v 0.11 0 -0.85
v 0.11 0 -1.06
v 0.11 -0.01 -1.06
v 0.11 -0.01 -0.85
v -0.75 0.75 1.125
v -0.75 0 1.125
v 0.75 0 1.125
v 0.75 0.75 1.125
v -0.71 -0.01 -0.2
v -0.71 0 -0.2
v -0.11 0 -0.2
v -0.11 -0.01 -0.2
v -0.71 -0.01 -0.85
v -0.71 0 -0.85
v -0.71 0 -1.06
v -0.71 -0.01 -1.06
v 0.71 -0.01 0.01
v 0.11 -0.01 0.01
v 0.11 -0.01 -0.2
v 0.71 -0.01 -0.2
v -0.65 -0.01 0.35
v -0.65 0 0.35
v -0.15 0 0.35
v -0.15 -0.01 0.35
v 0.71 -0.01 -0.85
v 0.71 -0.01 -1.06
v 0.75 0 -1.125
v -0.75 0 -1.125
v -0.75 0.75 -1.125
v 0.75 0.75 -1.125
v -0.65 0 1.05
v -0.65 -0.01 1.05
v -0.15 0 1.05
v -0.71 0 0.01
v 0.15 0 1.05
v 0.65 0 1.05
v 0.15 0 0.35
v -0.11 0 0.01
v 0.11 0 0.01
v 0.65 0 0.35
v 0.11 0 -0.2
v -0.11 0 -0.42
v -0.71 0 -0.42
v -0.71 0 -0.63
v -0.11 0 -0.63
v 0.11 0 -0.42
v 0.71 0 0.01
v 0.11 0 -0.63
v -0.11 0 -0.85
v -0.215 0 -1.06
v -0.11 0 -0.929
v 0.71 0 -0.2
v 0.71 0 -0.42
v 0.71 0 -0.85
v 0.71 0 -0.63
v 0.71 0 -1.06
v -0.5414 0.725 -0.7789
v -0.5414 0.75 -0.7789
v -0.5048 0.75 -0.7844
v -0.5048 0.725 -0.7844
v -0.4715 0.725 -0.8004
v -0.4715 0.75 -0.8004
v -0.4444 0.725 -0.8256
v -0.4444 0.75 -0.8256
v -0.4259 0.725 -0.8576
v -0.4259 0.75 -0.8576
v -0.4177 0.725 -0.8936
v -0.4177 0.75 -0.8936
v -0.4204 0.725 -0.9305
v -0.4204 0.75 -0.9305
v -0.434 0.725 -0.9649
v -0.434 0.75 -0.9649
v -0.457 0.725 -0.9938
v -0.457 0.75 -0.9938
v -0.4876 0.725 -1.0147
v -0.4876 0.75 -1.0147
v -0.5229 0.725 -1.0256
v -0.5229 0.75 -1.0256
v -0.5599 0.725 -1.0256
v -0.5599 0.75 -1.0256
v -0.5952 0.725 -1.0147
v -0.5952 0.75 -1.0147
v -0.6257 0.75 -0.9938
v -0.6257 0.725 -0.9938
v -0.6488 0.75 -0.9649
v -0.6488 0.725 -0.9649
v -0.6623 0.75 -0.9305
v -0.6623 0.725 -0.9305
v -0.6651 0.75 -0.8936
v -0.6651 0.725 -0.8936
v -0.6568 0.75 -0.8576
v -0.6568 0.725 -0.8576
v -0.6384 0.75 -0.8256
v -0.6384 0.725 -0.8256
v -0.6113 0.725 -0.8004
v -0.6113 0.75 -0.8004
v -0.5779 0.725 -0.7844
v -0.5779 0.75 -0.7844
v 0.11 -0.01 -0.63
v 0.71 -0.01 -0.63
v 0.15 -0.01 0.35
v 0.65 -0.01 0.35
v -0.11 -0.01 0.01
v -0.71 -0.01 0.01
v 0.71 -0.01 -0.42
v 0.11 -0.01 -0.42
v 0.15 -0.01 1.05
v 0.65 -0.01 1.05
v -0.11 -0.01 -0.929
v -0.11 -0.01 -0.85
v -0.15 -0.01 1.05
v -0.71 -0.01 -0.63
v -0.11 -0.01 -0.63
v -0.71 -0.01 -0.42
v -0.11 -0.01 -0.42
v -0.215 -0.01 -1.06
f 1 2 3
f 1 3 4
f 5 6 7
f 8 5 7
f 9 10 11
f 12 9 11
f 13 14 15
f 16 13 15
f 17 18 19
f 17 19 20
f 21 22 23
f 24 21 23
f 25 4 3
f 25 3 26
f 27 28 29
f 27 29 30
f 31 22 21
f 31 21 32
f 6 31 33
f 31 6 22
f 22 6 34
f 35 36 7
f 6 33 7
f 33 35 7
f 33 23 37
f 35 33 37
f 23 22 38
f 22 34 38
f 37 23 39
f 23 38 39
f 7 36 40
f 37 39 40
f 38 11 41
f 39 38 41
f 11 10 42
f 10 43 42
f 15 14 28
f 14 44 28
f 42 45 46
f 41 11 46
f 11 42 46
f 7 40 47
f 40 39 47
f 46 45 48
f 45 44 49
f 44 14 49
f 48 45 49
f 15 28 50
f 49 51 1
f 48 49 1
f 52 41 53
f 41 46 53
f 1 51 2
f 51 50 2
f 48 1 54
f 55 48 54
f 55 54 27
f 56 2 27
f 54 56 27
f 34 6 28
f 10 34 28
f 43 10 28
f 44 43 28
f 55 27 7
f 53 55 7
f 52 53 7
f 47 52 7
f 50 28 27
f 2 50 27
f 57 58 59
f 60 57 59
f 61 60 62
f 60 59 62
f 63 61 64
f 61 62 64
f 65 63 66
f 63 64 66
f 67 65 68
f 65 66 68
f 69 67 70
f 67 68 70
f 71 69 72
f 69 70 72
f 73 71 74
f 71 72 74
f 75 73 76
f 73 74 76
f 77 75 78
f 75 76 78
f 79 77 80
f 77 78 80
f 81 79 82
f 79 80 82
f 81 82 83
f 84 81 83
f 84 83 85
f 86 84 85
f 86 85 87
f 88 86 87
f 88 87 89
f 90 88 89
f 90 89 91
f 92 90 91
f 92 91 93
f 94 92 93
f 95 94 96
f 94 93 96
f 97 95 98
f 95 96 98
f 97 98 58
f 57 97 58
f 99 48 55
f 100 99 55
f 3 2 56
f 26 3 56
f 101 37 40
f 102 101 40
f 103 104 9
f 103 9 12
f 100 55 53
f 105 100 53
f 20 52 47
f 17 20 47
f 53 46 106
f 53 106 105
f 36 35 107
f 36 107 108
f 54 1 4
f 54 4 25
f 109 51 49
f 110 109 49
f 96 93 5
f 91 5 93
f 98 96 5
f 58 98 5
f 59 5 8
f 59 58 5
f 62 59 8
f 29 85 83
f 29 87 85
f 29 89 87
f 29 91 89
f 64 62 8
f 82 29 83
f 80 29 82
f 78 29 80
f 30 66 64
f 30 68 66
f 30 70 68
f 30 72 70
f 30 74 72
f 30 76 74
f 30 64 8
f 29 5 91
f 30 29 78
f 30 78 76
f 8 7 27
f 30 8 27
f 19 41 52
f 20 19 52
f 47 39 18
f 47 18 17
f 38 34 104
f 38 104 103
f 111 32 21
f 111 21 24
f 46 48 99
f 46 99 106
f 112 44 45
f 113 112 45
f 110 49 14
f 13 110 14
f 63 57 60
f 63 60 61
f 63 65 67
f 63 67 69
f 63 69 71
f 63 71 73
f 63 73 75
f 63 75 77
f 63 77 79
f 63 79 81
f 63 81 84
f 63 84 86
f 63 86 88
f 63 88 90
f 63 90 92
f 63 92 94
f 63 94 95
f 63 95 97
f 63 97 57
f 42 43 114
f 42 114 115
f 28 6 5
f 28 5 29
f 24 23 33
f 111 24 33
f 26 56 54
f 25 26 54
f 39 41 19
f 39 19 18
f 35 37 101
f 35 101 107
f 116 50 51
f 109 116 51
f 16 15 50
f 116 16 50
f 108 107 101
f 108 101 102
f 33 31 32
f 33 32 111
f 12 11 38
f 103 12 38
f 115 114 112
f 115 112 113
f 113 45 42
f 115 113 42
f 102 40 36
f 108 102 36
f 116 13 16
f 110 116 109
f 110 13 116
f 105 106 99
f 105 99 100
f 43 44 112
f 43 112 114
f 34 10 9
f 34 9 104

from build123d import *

# Parameters (mm, degrees)
SKETCH1_W           = 1.5
SKETCH1_H           = 2.25
BOSS_EXTRUDE1_DEPTH = 0.75
SKETCH2_R           = 0.124038388
CUT_EXTRUDE1_DEPTH  = 0.025
SKETCH3_W           = 0.5
SKETCH3_H           = 0.7
SKETCH3_W_2         = 0.6
SKETCH3_H_2         = 0.21
BOSS_EXTRUDE2_DEPTH = 0.01


with BuildPart() as part:
    # Sketch1 → Boss-Extrude1 (new body)
    with BuildSketch(Plane(origin=(0, 0, 0), x_dir=(1, 0, 0), z_dir=(0, 1, 0))):
        Rectangle(SKETCH1_W, SKETCH1_H)
    extrude(amount=BOSS_EXTRUDE1_DEPTH)

    # Sketch2 → Cut-Extrude1 (cut)
    with BuildSketch(Plane(origin=(0, 0.75, 0), x_dir=(1, 0, 0), z_dir=(0, 1, 0))):
        with Locations(Location((-0.541377071, 0.902898767, 0), (0, 0, 270))):
            Circle(SKETCH2_R)
    extrude(amount=-CUT_EXTRUDE1_DEPTH, mode=Mode.SUBTRACT)

    # Sketch3 → Boss-Extrude2 (add)
    with BuildSketch(Plane.XZ):
        with Locations((0.4, 0.7)):
            Rectangle(SKETCH3_W, SKETCH3_H)
        with Locations((-0.4, 0.7)):
            Rectangle(SKETCH3_W, SKETCH3_H)
        with Locations((0.41, -0.095)):
            Rectangle(SKETCH3_W_2, SKETCH3_H_2)
        with Locations((-0.41, -0.095)):
            Rectangle(SKETCH3_W_2, SKETCH3_H_2)
        with Locations((0.41, -0.525)):
            Rectangle(SKETCH3_W_2, SKETCH3_H_2)
        with Locations((0.41, -0.955)):
            Rectangle(SKETCH3_W_2, SKETCH3_H_2)
        with Locations((-0.41, -0.525)):
            Rectangle(SKETCH3_W_2, SKETCH3_H_2)
        Polygon((-0.71, -0.85), (-0.71, -1.06), (-0.215, -1.06), (-0.11, -0.928960223), (-0.11, -0.85), align=None)
    extrude(amount=BOSS_EXTRUDE2_DEPTH)


solid = part.part
